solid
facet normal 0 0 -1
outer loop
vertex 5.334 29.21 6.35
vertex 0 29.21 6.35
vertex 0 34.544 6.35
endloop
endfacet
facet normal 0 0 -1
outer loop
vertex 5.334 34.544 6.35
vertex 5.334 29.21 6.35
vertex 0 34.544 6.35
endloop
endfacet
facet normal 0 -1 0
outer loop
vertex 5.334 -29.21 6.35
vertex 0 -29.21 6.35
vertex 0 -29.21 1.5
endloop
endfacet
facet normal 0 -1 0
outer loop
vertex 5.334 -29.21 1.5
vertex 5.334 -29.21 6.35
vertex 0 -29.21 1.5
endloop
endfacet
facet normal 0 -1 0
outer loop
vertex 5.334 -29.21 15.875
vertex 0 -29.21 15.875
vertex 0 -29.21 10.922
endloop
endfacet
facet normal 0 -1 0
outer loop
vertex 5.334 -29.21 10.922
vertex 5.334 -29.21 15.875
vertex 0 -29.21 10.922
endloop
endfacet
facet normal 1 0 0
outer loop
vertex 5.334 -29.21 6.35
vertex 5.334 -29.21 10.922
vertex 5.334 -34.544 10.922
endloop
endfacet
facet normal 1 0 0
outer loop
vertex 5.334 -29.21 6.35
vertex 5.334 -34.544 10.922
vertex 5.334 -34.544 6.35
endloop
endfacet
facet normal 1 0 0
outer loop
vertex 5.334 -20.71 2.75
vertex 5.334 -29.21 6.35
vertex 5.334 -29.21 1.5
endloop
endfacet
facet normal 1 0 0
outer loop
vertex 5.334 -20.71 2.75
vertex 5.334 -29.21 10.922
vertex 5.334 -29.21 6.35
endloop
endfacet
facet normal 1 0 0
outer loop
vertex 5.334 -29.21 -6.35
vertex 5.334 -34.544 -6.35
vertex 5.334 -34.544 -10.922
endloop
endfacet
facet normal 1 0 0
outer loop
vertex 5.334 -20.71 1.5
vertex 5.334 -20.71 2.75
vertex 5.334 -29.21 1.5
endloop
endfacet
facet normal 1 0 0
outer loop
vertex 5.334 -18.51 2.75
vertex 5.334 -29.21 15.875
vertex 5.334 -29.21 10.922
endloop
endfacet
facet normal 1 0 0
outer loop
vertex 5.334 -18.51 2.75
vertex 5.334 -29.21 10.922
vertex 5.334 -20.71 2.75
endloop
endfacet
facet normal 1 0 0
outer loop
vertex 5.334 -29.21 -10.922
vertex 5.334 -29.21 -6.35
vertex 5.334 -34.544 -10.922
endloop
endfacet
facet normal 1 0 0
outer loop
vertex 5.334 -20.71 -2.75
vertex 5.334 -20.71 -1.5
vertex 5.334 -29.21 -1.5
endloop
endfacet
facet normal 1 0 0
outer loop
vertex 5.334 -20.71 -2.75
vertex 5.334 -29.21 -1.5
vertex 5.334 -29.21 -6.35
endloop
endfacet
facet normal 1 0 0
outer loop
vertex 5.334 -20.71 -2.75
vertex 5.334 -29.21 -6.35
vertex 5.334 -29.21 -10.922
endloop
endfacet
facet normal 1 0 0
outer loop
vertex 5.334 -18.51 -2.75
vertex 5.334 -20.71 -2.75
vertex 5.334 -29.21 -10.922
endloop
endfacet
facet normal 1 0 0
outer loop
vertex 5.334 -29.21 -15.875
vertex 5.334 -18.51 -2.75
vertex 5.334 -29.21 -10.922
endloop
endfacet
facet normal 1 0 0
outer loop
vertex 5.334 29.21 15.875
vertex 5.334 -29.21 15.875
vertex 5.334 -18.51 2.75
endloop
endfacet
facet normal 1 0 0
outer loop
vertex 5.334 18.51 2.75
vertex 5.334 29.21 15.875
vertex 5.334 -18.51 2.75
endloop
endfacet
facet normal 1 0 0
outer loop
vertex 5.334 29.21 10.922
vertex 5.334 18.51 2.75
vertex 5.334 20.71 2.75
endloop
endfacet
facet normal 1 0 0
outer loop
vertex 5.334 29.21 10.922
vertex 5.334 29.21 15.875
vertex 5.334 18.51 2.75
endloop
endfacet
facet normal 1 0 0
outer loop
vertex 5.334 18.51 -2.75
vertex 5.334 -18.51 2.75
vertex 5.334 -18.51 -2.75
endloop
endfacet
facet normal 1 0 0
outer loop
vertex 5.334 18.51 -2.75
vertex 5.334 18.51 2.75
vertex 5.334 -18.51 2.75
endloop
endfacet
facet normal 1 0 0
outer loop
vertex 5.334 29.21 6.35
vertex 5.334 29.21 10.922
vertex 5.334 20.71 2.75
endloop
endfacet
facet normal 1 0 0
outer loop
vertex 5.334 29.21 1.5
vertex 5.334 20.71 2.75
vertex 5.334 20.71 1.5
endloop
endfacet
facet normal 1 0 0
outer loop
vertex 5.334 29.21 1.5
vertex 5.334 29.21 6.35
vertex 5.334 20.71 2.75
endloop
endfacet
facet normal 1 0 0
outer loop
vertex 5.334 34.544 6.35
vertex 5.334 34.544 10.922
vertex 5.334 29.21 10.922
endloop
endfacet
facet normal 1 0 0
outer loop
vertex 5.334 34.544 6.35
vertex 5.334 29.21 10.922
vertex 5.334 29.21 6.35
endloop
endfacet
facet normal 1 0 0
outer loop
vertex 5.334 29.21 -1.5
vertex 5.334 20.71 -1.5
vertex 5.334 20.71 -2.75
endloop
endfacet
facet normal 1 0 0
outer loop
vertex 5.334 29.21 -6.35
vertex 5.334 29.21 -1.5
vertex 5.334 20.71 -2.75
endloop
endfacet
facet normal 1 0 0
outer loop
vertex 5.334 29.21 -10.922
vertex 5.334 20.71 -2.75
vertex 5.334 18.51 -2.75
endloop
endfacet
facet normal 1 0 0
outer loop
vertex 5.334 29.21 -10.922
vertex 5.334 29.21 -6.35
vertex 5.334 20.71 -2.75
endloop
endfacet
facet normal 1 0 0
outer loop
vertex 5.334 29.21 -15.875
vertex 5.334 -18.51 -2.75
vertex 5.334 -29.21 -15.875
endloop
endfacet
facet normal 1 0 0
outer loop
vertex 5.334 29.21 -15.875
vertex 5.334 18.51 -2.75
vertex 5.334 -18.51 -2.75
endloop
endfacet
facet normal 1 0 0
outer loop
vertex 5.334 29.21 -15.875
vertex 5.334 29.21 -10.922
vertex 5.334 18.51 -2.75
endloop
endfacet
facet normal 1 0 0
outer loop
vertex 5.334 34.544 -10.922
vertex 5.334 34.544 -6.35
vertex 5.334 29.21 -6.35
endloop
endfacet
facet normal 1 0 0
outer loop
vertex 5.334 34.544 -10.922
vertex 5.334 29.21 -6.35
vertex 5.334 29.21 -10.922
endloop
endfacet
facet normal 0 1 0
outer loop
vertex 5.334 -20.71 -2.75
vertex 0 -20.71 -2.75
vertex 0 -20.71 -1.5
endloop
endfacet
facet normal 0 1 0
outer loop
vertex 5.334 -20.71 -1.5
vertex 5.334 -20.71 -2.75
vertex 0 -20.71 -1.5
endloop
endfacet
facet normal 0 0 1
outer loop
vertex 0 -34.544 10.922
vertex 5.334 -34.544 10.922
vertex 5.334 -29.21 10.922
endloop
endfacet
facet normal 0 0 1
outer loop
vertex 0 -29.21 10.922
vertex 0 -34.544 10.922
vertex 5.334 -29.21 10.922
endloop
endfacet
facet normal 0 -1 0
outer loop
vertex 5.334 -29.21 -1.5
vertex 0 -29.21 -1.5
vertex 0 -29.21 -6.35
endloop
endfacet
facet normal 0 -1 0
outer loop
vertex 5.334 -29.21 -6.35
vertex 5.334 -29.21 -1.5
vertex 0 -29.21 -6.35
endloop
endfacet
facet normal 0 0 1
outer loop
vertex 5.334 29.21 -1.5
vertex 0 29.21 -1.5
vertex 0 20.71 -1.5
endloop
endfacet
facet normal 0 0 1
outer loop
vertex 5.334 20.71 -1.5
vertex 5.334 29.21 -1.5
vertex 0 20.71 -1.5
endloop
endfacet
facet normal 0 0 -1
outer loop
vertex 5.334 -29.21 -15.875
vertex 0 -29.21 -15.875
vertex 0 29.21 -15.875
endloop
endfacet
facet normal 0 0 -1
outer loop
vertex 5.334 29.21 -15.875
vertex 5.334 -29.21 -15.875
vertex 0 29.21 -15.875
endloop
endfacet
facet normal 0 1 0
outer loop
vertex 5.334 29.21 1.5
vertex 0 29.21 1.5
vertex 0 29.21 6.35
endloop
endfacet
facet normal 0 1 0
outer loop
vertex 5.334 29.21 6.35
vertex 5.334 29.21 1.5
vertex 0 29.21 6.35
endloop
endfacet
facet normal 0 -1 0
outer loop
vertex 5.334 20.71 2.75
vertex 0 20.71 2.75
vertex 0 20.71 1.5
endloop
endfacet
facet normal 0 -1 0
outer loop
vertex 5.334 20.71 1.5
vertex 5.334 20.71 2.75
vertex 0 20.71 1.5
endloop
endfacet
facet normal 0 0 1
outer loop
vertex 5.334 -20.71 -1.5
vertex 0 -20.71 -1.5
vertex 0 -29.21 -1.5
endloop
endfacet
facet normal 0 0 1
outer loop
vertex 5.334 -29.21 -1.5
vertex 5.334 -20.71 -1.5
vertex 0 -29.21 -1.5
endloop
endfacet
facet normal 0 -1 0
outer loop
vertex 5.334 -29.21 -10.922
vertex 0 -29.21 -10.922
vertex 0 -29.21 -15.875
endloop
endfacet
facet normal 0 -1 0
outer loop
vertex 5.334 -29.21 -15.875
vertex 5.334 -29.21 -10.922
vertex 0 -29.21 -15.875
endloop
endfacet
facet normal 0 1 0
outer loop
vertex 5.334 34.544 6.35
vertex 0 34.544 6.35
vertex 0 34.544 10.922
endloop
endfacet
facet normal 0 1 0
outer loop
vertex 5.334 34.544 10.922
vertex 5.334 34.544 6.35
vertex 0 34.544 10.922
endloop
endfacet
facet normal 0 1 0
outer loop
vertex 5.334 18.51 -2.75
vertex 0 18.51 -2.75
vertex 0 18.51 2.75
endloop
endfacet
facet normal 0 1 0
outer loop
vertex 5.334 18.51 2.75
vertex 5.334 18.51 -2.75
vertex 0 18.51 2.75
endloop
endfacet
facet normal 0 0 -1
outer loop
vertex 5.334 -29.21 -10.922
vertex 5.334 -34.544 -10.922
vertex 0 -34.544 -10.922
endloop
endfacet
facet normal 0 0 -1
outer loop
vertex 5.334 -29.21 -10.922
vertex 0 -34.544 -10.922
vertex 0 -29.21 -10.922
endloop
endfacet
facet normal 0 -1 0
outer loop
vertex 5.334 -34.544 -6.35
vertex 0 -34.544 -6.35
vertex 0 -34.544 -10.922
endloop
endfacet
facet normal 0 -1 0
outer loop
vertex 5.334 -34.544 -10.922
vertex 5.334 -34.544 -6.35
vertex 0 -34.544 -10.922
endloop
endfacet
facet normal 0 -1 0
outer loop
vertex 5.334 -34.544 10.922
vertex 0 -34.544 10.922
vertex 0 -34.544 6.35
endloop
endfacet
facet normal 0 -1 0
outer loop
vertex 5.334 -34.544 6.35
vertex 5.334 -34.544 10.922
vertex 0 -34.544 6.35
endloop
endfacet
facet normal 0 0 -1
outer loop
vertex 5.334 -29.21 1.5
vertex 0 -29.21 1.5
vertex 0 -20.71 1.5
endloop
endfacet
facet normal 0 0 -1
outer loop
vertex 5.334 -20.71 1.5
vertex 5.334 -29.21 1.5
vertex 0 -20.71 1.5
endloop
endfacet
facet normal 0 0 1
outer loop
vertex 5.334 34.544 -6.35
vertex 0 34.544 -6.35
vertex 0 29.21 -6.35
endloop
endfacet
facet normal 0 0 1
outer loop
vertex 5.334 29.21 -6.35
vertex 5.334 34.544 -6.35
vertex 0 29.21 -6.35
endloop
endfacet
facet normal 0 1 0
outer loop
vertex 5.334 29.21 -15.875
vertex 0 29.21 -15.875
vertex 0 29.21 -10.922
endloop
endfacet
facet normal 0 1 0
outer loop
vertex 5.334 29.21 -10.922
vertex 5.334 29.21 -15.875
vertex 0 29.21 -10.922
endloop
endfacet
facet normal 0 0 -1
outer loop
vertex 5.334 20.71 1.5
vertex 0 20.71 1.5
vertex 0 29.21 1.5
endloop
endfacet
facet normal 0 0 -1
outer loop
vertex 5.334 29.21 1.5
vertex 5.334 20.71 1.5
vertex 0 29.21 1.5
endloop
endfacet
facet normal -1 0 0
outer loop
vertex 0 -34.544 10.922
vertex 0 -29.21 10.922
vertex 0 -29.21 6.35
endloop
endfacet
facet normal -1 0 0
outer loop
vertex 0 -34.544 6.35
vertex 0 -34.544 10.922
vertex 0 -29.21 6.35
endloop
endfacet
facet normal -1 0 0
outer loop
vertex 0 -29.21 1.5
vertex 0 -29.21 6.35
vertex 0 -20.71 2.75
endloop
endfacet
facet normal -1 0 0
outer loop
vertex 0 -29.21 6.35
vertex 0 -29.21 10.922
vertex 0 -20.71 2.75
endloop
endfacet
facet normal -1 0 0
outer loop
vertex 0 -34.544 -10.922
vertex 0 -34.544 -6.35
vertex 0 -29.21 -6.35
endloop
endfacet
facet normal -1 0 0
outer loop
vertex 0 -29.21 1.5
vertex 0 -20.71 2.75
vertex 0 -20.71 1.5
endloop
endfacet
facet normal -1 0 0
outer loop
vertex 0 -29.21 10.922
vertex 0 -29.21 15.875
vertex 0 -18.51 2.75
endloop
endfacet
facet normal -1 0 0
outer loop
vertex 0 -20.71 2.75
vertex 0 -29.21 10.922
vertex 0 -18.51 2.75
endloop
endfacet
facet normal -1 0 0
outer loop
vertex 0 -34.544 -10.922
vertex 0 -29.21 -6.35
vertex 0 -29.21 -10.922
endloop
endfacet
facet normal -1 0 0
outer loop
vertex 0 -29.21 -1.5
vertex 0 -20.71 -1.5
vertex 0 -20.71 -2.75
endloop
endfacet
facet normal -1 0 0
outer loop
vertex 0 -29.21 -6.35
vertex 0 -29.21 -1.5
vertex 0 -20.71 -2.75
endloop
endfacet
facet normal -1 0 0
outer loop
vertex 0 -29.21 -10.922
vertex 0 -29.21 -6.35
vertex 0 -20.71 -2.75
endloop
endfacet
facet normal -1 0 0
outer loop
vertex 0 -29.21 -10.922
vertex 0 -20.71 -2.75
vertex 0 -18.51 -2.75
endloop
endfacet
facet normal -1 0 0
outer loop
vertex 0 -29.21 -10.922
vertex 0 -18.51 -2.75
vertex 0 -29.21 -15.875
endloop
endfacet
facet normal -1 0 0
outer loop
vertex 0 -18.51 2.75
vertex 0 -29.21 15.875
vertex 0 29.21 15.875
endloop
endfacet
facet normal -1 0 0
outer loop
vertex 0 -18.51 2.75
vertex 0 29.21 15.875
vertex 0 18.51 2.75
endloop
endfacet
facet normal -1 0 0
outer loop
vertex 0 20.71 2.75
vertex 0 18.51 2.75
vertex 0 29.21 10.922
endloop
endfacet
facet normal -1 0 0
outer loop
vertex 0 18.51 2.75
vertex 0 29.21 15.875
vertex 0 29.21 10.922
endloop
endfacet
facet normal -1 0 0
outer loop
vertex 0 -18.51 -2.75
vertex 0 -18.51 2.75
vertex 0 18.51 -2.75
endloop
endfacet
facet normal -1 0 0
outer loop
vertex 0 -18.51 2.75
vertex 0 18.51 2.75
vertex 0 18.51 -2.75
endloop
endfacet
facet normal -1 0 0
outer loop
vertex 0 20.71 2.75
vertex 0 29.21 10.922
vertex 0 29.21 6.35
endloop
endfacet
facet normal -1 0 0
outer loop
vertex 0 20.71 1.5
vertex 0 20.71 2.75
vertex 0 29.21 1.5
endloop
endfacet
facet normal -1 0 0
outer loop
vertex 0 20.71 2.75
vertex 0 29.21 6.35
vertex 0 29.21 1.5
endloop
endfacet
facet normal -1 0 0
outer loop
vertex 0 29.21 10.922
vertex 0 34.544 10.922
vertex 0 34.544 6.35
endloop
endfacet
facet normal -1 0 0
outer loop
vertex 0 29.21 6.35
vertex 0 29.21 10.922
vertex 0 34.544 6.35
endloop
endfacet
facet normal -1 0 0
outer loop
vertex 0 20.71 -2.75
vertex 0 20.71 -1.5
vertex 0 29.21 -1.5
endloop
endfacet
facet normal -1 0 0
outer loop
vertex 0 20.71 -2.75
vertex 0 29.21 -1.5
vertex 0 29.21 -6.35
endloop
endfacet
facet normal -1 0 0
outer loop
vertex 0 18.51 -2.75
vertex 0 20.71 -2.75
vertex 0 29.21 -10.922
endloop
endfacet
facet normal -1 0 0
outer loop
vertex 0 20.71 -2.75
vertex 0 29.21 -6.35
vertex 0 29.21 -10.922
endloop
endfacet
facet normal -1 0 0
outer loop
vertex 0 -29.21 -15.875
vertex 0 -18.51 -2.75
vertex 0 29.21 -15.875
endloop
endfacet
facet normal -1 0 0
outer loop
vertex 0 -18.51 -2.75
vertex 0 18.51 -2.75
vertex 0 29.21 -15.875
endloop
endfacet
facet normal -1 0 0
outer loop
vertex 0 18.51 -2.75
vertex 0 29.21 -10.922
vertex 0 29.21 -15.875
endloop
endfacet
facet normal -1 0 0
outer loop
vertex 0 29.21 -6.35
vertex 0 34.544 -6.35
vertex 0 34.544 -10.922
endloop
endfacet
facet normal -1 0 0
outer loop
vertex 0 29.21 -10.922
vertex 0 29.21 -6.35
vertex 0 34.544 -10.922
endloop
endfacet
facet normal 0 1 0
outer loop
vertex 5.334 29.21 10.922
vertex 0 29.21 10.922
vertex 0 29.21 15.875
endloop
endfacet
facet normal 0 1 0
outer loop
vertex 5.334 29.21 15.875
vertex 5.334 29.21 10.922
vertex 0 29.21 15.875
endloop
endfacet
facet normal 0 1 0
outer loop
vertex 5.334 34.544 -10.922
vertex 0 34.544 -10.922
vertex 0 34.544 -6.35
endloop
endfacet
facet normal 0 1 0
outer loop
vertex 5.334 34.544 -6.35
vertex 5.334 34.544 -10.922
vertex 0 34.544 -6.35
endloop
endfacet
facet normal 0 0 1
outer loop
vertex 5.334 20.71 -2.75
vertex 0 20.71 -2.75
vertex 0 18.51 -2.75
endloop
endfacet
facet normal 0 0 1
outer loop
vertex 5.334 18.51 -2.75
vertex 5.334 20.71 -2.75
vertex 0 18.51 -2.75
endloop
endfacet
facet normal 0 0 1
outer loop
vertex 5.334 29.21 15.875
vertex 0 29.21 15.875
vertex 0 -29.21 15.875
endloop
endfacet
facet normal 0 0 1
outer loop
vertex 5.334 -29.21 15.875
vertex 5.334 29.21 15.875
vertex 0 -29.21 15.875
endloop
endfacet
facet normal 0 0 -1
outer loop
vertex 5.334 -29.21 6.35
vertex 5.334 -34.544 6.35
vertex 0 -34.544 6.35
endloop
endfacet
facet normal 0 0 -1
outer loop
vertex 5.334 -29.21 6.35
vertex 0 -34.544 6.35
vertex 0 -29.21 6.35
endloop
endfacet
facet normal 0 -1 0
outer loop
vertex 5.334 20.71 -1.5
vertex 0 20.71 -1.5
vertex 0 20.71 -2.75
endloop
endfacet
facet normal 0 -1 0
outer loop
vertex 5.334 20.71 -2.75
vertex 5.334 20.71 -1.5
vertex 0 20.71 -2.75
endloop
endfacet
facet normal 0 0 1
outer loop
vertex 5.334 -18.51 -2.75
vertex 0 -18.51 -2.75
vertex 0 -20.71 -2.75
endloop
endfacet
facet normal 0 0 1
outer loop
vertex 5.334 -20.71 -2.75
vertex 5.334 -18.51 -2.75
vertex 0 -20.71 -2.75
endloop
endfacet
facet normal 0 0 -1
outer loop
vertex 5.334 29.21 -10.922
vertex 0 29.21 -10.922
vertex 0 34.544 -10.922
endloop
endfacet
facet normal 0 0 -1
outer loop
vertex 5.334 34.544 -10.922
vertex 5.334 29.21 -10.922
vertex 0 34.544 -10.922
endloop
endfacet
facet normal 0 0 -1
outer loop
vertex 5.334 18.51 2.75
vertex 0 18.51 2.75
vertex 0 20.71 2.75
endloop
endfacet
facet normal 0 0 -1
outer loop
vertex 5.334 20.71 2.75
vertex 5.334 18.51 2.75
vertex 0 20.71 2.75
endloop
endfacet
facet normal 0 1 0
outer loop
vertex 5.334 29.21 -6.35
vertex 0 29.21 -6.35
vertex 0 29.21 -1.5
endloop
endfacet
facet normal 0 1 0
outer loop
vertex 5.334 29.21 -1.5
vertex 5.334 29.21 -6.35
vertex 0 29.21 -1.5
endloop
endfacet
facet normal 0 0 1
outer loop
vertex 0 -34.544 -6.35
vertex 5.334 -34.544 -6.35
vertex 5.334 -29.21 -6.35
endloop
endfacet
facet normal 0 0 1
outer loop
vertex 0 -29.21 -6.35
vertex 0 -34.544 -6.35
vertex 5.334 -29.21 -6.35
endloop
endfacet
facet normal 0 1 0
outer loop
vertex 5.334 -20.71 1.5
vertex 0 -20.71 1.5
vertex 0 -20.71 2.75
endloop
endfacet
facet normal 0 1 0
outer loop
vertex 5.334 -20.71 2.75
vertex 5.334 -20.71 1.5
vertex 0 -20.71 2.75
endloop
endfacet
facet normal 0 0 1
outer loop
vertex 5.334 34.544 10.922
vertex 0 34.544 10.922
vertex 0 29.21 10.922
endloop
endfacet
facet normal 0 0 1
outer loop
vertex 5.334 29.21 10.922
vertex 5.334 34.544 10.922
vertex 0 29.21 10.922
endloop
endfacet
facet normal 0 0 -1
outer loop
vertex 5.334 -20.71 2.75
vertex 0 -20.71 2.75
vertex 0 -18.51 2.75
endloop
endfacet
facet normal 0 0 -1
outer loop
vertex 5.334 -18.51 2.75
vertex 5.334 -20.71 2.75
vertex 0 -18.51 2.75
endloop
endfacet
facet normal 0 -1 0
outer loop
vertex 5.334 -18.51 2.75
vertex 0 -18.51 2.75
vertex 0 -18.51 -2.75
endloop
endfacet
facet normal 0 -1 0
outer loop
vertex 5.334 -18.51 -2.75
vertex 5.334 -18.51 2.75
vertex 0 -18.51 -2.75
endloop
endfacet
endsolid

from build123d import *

# Parameters (mm, degrees)
SKETCH1_W           = 4.572
SKETCH1_H           = 5.334
BOSS_EXTRUDE1_DEPTH = 5.334


with BuildPart() as part:
    # Sketch1 → Boss-Extrude1 (new body)
    with BuildSketch(Plane(origin=(0, 0, 0), x_dir=(0, 0, -1), z_dir=(1, 0, 0))):
        Polygon((-15.875, -29.21), (-1.5, -29.21), (-1.5, -20.71), (-2.75, -20.71), (-2.75, -18.51), (2.75, -18.51), (2.75, -20.71), (1.5, -20.71), (1.5, -29.21), (15.875, -29.21), (15.875, 29.21), (10.922, 29.21), (10.922, 34.544), (6.35, 34.544), (6.35, 29.21), (1.5, 29.21), (1.5, 20.71), (2.75, 20.71), (2.75, 18.51), (-2.75, 18.51), (-2.75, 20.71), (-1.5, 20.71), (-1.5, 29.21), (-6.35, 29.21), (-6.35, 34.544), (-10.922, 34.544), (-10.922, 29.21), (-15.875, 29.21), align=None)
        with Locations((-8.636, -31.877)):
            Rectangle(SKETCH1_W, SKETCH1_H)
        with Locations((8.636, -31.877)):
            Rectangle(SKETCH1_W, SKETCH1_H)
    extrude(amount=BOSS_EXTRUDE1_DEPTH)


solid = part.part
